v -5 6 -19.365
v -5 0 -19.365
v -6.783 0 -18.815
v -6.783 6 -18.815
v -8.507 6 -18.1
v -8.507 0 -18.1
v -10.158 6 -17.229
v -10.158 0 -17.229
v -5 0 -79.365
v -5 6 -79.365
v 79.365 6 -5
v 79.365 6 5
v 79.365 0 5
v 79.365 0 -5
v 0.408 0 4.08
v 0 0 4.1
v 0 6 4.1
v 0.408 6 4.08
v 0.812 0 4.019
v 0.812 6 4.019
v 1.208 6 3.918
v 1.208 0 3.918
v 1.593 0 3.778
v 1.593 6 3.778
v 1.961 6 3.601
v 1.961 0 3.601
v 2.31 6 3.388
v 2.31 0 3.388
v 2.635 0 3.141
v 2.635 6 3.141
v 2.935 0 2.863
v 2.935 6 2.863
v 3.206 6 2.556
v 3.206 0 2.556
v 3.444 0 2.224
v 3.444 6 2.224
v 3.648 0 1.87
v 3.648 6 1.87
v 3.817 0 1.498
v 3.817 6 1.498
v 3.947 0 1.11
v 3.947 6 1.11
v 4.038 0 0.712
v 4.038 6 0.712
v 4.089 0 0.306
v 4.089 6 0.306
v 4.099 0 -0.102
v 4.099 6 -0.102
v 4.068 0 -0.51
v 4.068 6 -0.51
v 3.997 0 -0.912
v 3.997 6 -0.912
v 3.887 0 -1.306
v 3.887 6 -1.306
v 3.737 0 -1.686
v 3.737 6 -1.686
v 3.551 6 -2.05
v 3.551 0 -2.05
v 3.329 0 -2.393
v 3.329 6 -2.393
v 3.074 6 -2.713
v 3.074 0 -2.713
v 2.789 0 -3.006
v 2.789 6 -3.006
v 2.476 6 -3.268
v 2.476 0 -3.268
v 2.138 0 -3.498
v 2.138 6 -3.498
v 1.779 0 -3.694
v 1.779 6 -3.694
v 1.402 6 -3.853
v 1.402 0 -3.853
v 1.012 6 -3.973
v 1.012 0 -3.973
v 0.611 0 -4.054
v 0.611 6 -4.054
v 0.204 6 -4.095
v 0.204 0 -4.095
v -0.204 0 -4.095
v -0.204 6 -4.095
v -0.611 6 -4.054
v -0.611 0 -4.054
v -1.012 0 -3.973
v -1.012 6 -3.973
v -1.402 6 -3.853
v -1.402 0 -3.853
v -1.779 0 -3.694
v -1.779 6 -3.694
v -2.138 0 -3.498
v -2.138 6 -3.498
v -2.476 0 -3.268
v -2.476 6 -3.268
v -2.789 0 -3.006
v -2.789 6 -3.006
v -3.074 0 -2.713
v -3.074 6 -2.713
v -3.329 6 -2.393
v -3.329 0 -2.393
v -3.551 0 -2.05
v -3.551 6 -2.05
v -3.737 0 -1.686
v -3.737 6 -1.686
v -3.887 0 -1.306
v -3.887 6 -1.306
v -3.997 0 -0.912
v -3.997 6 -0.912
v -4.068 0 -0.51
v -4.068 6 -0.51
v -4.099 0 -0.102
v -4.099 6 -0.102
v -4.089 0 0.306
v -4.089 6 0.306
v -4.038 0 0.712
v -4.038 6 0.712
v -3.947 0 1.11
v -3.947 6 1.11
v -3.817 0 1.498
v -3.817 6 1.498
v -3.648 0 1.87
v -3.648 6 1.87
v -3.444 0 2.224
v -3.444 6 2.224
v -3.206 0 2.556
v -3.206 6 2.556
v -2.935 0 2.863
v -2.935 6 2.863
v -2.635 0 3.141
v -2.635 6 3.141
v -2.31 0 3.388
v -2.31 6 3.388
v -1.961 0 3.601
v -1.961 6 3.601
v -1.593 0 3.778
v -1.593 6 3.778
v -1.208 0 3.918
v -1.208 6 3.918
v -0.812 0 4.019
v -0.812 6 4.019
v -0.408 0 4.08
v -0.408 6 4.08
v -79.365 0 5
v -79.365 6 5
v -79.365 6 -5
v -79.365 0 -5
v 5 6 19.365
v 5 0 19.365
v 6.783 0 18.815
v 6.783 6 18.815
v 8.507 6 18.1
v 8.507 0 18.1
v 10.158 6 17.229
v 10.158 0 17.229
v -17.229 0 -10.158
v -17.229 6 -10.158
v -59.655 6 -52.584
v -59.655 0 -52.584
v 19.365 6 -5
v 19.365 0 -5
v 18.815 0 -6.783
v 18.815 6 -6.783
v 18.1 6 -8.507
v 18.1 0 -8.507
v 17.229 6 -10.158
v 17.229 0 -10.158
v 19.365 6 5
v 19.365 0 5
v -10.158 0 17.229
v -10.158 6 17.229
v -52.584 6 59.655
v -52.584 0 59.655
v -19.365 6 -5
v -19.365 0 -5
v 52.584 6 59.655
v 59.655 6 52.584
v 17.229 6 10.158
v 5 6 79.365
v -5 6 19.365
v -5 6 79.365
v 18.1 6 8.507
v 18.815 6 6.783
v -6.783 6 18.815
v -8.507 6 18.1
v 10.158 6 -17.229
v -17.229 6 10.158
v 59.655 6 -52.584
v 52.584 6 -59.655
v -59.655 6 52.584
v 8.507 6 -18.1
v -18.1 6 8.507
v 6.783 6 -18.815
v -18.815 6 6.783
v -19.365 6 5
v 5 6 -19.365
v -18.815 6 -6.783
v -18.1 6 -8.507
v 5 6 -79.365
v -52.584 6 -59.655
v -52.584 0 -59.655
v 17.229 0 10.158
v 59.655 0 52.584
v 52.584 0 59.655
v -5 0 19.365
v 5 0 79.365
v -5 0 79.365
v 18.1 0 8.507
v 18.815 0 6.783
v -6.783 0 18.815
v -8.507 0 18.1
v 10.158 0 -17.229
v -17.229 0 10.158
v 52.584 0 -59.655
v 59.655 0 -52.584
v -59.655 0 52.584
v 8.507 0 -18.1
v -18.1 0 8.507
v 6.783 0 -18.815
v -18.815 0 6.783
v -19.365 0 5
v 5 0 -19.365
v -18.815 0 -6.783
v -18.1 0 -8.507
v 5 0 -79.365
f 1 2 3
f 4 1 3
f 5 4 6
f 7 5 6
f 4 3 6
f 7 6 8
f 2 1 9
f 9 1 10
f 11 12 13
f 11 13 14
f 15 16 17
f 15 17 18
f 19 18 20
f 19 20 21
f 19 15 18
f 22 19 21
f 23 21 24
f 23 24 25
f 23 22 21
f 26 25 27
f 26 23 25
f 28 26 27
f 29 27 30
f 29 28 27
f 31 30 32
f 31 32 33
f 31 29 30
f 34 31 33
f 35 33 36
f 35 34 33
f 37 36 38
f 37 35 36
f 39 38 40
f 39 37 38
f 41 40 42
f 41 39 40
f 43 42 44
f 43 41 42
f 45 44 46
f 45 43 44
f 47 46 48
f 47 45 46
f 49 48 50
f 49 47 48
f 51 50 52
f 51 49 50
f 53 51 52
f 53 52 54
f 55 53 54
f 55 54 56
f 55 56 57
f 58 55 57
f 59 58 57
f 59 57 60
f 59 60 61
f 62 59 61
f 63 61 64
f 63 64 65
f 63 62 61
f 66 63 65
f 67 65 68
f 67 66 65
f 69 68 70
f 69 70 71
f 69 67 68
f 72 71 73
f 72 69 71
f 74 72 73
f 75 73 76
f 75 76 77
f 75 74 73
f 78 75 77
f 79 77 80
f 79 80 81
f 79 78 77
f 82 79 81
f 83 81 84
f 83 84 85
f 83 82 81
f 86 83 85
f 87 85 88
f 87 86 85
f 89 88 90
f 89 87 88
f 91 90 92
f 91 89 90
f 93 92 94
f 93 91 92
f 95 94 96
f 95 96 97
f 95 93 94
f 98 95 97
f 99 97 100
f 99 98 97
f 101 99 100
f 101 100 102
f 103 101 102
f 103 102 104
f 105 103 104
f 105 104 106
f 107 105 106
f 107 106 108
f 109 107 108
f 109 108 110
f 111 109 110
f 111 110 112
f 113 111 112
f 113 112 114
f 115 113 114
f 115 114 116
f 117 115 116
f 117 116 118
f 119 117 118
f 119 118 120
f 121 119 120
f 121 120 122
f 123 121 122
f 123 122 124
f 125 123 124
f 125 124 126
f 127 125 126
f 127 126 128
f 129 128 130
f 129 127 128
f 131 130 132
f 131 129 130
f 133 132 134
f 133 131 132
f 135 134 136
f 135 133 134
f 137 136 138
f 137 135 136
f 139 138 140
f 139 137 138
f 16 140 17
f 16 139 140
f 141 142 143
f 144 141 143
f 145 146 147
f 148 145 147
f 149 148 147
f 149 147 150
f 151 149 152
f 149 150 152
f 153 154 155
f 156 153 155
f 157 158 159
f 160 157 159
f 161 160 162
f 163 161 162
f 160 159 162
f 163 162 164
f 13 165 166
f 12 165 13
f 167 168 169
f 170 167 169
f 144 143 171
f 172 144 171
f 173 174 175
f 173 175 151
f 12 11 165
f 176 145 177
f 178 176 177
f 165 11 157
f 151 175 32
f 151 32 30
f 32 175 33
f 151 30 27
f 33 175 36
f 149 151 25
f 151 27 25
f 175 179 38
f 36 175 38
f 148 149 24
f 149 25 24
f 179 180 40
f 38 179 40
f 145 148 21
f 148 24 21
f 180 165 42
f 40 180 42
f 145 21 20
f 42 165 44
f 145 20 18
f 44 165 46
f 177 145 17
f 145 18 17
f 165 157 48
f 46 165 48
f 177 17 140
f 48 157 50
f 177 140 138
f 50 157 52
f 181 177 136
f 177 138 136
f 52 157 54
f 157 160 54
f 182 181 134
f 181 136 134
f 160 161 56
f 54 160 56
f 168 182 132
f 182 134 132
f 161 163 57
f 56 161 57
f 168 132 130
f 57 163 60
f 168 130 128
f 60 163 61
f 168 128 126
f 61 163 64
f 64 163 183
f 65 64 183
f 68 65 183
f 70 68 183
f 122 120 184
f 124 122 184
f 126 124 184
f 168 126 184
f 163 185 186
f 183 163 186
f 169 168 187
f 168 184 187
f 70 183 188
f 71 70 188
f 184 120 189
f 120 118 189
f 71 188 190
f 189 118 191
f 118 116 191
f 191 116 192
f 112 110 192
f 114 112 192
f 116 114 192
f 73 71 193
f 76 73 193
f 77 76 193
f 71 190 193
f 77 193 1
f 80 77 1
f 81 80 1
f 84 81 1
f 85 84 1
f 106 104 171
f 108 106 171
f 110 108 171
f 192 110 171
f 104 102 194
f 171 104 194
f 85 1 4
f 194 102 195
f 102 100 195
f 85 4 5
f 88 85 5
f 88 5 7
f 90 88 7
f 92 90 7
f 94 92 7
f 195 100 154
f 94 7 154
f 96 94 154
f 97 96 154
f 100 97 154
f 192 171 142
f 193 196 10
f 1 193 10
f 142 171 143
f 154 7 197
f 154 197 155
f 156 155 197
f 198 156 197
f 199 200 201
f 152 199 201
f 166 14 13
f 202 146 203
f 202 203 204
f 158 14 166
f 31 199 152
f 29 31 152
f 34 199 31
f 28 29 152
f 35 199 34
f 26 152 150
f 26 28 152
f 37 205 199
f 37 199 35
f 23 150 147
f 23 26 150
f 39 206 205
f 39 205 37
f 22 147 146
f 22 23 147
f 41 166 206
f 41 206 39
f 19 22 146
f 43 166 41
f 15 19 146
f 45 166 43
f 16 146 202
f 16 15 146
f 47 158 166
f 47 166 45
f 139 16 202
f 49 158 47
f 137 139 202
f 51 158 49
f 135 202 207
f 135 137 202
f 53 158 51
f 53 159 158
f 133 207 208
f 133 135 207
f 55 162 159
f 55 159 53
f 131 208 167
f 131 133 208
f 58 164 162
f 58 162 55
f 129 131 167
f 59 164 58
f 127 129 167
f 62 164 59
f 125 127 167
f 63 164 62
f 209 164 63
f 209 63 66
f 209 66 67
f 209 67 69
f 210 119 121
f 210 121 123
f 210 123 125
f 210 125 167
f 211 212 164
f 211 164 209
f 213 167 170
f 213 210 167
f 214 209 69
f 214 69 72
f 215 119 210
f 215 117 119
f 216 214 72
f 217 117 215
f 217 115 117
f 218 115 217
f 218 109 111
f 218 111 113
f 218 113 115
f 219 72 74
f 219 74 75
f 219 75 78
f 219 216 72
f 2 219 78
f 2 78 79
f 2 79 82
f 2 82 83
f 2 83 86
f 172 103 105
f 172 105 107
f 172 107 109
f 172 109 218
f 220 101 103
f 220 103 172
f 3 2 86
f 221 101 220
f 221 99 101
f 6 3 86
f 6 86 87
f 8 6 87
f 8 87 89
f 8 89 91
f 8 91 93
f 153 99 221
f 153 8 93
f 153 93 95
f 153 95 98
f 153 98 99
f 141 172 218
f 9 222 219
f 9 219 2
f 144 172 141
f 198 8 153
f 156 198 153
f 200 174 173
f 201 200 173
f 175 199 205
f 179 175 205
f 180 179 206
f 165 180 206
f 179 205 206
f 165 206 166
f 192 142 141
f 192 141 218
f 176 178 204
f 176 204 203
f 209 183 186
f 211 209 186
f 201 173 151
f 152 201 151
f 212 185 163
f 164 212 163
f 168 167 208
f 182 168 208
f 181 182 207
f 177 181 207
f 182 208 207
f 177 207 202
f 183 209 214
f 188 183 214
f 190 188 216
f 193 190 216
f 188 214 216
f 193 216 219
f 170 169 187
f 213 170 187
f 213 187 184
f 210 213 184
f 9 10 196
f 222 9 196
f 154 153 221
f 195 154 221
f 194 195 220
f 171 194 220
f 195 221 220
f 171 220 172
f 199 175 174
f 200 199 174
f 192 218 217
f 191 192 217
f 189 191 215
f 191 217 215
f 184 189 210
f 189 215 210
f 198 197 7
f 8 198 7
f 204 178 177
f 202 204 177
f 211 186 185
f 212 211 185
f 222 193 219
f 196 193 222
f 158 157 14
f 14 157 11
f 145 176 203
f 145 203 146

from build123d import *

# Parameters (mm, degrees)
ESBO_O1_R                = 20
ESBO_O1_R_2              = 4.1
RESSALTO_EXTRUS_O1_DEPTH = 6
ESBO_O2_W                = 10
ESBO_O2_H                = 60
ESBO_O2_W_2              = 60
ESBO_O2_H_2              = 10
RESSALTO_EXTRUS_O2_DEPTH = 6


with BuildPart() as part:
    # Esboço1 → Ressalto-extrusão1 (new body)
    with BuildSketch(Plane(origin=(0, 0, 0), x_dir=(1, 0, 0), z_dir=(0, 1, 0))):
        with Locations(Location((0, 0, 0), (0, 0, 270))):
            Circle(ESBO_O1_R)
        with Locations(Location((0, 0, 0), (0, 0, 270))):
            Circle(ESBO_O1_R_2, mode=Mode.SUBTRACT)
    extrude(amount=RESSALTO_EXTRUS_O1_DEPTH)

    # Esboço2 → Ressalto-extrusão2 (add)
    with BuildSketch(Plane(origin=(0, 6, 0), x_dir=(1, 0, 0), z_dir=(0, 1, 0))):
        Polygon((52.583936903, 59.655004715), (59.655004715, 52.583936903), (17.228597844, 10.157530032), (10.157530032, 17.228597844), align=None)
        with Locations((0, 49.364916731)):
            Rectangle(ESBO_O2_W, ESBO_O2_H)
        with Locations((49.364916731, 0)):
            Rectangle(ESBO_O2_W_2, ESBO_O2_H_2)
        Polygon((59.655004715, -52.583936903), (52.583936903, -59.655004715), (10.157530032, -17.228597844), (17.228597844, -10.157530032), align=None)
        with Locations((0, -49.364916731)):
            Rectangle(ESBO_O2_W, ESBO_O2_H)
        Polygon((-52.583936903, -59.655004715), (-59.655004715, -52.583936903), (-17.228597844, -10.157530032), (-10.157530032, -17.228597844), align=None)
        with Locations((-49.364916731, 0)):
            Rectangle(ESBO_O2_W_2, ESBO_O2_H_2)
        Polygon((-59.655004715, 52.583936903), (-52.583936903, 59.655004715), (-10.157530032, 17.228597844), (-17.228597844, 10.157530032), align=None)
    extrude(amount=-RESSALTO_EXTRUS_O2_DEPTH)


solid = part.part
